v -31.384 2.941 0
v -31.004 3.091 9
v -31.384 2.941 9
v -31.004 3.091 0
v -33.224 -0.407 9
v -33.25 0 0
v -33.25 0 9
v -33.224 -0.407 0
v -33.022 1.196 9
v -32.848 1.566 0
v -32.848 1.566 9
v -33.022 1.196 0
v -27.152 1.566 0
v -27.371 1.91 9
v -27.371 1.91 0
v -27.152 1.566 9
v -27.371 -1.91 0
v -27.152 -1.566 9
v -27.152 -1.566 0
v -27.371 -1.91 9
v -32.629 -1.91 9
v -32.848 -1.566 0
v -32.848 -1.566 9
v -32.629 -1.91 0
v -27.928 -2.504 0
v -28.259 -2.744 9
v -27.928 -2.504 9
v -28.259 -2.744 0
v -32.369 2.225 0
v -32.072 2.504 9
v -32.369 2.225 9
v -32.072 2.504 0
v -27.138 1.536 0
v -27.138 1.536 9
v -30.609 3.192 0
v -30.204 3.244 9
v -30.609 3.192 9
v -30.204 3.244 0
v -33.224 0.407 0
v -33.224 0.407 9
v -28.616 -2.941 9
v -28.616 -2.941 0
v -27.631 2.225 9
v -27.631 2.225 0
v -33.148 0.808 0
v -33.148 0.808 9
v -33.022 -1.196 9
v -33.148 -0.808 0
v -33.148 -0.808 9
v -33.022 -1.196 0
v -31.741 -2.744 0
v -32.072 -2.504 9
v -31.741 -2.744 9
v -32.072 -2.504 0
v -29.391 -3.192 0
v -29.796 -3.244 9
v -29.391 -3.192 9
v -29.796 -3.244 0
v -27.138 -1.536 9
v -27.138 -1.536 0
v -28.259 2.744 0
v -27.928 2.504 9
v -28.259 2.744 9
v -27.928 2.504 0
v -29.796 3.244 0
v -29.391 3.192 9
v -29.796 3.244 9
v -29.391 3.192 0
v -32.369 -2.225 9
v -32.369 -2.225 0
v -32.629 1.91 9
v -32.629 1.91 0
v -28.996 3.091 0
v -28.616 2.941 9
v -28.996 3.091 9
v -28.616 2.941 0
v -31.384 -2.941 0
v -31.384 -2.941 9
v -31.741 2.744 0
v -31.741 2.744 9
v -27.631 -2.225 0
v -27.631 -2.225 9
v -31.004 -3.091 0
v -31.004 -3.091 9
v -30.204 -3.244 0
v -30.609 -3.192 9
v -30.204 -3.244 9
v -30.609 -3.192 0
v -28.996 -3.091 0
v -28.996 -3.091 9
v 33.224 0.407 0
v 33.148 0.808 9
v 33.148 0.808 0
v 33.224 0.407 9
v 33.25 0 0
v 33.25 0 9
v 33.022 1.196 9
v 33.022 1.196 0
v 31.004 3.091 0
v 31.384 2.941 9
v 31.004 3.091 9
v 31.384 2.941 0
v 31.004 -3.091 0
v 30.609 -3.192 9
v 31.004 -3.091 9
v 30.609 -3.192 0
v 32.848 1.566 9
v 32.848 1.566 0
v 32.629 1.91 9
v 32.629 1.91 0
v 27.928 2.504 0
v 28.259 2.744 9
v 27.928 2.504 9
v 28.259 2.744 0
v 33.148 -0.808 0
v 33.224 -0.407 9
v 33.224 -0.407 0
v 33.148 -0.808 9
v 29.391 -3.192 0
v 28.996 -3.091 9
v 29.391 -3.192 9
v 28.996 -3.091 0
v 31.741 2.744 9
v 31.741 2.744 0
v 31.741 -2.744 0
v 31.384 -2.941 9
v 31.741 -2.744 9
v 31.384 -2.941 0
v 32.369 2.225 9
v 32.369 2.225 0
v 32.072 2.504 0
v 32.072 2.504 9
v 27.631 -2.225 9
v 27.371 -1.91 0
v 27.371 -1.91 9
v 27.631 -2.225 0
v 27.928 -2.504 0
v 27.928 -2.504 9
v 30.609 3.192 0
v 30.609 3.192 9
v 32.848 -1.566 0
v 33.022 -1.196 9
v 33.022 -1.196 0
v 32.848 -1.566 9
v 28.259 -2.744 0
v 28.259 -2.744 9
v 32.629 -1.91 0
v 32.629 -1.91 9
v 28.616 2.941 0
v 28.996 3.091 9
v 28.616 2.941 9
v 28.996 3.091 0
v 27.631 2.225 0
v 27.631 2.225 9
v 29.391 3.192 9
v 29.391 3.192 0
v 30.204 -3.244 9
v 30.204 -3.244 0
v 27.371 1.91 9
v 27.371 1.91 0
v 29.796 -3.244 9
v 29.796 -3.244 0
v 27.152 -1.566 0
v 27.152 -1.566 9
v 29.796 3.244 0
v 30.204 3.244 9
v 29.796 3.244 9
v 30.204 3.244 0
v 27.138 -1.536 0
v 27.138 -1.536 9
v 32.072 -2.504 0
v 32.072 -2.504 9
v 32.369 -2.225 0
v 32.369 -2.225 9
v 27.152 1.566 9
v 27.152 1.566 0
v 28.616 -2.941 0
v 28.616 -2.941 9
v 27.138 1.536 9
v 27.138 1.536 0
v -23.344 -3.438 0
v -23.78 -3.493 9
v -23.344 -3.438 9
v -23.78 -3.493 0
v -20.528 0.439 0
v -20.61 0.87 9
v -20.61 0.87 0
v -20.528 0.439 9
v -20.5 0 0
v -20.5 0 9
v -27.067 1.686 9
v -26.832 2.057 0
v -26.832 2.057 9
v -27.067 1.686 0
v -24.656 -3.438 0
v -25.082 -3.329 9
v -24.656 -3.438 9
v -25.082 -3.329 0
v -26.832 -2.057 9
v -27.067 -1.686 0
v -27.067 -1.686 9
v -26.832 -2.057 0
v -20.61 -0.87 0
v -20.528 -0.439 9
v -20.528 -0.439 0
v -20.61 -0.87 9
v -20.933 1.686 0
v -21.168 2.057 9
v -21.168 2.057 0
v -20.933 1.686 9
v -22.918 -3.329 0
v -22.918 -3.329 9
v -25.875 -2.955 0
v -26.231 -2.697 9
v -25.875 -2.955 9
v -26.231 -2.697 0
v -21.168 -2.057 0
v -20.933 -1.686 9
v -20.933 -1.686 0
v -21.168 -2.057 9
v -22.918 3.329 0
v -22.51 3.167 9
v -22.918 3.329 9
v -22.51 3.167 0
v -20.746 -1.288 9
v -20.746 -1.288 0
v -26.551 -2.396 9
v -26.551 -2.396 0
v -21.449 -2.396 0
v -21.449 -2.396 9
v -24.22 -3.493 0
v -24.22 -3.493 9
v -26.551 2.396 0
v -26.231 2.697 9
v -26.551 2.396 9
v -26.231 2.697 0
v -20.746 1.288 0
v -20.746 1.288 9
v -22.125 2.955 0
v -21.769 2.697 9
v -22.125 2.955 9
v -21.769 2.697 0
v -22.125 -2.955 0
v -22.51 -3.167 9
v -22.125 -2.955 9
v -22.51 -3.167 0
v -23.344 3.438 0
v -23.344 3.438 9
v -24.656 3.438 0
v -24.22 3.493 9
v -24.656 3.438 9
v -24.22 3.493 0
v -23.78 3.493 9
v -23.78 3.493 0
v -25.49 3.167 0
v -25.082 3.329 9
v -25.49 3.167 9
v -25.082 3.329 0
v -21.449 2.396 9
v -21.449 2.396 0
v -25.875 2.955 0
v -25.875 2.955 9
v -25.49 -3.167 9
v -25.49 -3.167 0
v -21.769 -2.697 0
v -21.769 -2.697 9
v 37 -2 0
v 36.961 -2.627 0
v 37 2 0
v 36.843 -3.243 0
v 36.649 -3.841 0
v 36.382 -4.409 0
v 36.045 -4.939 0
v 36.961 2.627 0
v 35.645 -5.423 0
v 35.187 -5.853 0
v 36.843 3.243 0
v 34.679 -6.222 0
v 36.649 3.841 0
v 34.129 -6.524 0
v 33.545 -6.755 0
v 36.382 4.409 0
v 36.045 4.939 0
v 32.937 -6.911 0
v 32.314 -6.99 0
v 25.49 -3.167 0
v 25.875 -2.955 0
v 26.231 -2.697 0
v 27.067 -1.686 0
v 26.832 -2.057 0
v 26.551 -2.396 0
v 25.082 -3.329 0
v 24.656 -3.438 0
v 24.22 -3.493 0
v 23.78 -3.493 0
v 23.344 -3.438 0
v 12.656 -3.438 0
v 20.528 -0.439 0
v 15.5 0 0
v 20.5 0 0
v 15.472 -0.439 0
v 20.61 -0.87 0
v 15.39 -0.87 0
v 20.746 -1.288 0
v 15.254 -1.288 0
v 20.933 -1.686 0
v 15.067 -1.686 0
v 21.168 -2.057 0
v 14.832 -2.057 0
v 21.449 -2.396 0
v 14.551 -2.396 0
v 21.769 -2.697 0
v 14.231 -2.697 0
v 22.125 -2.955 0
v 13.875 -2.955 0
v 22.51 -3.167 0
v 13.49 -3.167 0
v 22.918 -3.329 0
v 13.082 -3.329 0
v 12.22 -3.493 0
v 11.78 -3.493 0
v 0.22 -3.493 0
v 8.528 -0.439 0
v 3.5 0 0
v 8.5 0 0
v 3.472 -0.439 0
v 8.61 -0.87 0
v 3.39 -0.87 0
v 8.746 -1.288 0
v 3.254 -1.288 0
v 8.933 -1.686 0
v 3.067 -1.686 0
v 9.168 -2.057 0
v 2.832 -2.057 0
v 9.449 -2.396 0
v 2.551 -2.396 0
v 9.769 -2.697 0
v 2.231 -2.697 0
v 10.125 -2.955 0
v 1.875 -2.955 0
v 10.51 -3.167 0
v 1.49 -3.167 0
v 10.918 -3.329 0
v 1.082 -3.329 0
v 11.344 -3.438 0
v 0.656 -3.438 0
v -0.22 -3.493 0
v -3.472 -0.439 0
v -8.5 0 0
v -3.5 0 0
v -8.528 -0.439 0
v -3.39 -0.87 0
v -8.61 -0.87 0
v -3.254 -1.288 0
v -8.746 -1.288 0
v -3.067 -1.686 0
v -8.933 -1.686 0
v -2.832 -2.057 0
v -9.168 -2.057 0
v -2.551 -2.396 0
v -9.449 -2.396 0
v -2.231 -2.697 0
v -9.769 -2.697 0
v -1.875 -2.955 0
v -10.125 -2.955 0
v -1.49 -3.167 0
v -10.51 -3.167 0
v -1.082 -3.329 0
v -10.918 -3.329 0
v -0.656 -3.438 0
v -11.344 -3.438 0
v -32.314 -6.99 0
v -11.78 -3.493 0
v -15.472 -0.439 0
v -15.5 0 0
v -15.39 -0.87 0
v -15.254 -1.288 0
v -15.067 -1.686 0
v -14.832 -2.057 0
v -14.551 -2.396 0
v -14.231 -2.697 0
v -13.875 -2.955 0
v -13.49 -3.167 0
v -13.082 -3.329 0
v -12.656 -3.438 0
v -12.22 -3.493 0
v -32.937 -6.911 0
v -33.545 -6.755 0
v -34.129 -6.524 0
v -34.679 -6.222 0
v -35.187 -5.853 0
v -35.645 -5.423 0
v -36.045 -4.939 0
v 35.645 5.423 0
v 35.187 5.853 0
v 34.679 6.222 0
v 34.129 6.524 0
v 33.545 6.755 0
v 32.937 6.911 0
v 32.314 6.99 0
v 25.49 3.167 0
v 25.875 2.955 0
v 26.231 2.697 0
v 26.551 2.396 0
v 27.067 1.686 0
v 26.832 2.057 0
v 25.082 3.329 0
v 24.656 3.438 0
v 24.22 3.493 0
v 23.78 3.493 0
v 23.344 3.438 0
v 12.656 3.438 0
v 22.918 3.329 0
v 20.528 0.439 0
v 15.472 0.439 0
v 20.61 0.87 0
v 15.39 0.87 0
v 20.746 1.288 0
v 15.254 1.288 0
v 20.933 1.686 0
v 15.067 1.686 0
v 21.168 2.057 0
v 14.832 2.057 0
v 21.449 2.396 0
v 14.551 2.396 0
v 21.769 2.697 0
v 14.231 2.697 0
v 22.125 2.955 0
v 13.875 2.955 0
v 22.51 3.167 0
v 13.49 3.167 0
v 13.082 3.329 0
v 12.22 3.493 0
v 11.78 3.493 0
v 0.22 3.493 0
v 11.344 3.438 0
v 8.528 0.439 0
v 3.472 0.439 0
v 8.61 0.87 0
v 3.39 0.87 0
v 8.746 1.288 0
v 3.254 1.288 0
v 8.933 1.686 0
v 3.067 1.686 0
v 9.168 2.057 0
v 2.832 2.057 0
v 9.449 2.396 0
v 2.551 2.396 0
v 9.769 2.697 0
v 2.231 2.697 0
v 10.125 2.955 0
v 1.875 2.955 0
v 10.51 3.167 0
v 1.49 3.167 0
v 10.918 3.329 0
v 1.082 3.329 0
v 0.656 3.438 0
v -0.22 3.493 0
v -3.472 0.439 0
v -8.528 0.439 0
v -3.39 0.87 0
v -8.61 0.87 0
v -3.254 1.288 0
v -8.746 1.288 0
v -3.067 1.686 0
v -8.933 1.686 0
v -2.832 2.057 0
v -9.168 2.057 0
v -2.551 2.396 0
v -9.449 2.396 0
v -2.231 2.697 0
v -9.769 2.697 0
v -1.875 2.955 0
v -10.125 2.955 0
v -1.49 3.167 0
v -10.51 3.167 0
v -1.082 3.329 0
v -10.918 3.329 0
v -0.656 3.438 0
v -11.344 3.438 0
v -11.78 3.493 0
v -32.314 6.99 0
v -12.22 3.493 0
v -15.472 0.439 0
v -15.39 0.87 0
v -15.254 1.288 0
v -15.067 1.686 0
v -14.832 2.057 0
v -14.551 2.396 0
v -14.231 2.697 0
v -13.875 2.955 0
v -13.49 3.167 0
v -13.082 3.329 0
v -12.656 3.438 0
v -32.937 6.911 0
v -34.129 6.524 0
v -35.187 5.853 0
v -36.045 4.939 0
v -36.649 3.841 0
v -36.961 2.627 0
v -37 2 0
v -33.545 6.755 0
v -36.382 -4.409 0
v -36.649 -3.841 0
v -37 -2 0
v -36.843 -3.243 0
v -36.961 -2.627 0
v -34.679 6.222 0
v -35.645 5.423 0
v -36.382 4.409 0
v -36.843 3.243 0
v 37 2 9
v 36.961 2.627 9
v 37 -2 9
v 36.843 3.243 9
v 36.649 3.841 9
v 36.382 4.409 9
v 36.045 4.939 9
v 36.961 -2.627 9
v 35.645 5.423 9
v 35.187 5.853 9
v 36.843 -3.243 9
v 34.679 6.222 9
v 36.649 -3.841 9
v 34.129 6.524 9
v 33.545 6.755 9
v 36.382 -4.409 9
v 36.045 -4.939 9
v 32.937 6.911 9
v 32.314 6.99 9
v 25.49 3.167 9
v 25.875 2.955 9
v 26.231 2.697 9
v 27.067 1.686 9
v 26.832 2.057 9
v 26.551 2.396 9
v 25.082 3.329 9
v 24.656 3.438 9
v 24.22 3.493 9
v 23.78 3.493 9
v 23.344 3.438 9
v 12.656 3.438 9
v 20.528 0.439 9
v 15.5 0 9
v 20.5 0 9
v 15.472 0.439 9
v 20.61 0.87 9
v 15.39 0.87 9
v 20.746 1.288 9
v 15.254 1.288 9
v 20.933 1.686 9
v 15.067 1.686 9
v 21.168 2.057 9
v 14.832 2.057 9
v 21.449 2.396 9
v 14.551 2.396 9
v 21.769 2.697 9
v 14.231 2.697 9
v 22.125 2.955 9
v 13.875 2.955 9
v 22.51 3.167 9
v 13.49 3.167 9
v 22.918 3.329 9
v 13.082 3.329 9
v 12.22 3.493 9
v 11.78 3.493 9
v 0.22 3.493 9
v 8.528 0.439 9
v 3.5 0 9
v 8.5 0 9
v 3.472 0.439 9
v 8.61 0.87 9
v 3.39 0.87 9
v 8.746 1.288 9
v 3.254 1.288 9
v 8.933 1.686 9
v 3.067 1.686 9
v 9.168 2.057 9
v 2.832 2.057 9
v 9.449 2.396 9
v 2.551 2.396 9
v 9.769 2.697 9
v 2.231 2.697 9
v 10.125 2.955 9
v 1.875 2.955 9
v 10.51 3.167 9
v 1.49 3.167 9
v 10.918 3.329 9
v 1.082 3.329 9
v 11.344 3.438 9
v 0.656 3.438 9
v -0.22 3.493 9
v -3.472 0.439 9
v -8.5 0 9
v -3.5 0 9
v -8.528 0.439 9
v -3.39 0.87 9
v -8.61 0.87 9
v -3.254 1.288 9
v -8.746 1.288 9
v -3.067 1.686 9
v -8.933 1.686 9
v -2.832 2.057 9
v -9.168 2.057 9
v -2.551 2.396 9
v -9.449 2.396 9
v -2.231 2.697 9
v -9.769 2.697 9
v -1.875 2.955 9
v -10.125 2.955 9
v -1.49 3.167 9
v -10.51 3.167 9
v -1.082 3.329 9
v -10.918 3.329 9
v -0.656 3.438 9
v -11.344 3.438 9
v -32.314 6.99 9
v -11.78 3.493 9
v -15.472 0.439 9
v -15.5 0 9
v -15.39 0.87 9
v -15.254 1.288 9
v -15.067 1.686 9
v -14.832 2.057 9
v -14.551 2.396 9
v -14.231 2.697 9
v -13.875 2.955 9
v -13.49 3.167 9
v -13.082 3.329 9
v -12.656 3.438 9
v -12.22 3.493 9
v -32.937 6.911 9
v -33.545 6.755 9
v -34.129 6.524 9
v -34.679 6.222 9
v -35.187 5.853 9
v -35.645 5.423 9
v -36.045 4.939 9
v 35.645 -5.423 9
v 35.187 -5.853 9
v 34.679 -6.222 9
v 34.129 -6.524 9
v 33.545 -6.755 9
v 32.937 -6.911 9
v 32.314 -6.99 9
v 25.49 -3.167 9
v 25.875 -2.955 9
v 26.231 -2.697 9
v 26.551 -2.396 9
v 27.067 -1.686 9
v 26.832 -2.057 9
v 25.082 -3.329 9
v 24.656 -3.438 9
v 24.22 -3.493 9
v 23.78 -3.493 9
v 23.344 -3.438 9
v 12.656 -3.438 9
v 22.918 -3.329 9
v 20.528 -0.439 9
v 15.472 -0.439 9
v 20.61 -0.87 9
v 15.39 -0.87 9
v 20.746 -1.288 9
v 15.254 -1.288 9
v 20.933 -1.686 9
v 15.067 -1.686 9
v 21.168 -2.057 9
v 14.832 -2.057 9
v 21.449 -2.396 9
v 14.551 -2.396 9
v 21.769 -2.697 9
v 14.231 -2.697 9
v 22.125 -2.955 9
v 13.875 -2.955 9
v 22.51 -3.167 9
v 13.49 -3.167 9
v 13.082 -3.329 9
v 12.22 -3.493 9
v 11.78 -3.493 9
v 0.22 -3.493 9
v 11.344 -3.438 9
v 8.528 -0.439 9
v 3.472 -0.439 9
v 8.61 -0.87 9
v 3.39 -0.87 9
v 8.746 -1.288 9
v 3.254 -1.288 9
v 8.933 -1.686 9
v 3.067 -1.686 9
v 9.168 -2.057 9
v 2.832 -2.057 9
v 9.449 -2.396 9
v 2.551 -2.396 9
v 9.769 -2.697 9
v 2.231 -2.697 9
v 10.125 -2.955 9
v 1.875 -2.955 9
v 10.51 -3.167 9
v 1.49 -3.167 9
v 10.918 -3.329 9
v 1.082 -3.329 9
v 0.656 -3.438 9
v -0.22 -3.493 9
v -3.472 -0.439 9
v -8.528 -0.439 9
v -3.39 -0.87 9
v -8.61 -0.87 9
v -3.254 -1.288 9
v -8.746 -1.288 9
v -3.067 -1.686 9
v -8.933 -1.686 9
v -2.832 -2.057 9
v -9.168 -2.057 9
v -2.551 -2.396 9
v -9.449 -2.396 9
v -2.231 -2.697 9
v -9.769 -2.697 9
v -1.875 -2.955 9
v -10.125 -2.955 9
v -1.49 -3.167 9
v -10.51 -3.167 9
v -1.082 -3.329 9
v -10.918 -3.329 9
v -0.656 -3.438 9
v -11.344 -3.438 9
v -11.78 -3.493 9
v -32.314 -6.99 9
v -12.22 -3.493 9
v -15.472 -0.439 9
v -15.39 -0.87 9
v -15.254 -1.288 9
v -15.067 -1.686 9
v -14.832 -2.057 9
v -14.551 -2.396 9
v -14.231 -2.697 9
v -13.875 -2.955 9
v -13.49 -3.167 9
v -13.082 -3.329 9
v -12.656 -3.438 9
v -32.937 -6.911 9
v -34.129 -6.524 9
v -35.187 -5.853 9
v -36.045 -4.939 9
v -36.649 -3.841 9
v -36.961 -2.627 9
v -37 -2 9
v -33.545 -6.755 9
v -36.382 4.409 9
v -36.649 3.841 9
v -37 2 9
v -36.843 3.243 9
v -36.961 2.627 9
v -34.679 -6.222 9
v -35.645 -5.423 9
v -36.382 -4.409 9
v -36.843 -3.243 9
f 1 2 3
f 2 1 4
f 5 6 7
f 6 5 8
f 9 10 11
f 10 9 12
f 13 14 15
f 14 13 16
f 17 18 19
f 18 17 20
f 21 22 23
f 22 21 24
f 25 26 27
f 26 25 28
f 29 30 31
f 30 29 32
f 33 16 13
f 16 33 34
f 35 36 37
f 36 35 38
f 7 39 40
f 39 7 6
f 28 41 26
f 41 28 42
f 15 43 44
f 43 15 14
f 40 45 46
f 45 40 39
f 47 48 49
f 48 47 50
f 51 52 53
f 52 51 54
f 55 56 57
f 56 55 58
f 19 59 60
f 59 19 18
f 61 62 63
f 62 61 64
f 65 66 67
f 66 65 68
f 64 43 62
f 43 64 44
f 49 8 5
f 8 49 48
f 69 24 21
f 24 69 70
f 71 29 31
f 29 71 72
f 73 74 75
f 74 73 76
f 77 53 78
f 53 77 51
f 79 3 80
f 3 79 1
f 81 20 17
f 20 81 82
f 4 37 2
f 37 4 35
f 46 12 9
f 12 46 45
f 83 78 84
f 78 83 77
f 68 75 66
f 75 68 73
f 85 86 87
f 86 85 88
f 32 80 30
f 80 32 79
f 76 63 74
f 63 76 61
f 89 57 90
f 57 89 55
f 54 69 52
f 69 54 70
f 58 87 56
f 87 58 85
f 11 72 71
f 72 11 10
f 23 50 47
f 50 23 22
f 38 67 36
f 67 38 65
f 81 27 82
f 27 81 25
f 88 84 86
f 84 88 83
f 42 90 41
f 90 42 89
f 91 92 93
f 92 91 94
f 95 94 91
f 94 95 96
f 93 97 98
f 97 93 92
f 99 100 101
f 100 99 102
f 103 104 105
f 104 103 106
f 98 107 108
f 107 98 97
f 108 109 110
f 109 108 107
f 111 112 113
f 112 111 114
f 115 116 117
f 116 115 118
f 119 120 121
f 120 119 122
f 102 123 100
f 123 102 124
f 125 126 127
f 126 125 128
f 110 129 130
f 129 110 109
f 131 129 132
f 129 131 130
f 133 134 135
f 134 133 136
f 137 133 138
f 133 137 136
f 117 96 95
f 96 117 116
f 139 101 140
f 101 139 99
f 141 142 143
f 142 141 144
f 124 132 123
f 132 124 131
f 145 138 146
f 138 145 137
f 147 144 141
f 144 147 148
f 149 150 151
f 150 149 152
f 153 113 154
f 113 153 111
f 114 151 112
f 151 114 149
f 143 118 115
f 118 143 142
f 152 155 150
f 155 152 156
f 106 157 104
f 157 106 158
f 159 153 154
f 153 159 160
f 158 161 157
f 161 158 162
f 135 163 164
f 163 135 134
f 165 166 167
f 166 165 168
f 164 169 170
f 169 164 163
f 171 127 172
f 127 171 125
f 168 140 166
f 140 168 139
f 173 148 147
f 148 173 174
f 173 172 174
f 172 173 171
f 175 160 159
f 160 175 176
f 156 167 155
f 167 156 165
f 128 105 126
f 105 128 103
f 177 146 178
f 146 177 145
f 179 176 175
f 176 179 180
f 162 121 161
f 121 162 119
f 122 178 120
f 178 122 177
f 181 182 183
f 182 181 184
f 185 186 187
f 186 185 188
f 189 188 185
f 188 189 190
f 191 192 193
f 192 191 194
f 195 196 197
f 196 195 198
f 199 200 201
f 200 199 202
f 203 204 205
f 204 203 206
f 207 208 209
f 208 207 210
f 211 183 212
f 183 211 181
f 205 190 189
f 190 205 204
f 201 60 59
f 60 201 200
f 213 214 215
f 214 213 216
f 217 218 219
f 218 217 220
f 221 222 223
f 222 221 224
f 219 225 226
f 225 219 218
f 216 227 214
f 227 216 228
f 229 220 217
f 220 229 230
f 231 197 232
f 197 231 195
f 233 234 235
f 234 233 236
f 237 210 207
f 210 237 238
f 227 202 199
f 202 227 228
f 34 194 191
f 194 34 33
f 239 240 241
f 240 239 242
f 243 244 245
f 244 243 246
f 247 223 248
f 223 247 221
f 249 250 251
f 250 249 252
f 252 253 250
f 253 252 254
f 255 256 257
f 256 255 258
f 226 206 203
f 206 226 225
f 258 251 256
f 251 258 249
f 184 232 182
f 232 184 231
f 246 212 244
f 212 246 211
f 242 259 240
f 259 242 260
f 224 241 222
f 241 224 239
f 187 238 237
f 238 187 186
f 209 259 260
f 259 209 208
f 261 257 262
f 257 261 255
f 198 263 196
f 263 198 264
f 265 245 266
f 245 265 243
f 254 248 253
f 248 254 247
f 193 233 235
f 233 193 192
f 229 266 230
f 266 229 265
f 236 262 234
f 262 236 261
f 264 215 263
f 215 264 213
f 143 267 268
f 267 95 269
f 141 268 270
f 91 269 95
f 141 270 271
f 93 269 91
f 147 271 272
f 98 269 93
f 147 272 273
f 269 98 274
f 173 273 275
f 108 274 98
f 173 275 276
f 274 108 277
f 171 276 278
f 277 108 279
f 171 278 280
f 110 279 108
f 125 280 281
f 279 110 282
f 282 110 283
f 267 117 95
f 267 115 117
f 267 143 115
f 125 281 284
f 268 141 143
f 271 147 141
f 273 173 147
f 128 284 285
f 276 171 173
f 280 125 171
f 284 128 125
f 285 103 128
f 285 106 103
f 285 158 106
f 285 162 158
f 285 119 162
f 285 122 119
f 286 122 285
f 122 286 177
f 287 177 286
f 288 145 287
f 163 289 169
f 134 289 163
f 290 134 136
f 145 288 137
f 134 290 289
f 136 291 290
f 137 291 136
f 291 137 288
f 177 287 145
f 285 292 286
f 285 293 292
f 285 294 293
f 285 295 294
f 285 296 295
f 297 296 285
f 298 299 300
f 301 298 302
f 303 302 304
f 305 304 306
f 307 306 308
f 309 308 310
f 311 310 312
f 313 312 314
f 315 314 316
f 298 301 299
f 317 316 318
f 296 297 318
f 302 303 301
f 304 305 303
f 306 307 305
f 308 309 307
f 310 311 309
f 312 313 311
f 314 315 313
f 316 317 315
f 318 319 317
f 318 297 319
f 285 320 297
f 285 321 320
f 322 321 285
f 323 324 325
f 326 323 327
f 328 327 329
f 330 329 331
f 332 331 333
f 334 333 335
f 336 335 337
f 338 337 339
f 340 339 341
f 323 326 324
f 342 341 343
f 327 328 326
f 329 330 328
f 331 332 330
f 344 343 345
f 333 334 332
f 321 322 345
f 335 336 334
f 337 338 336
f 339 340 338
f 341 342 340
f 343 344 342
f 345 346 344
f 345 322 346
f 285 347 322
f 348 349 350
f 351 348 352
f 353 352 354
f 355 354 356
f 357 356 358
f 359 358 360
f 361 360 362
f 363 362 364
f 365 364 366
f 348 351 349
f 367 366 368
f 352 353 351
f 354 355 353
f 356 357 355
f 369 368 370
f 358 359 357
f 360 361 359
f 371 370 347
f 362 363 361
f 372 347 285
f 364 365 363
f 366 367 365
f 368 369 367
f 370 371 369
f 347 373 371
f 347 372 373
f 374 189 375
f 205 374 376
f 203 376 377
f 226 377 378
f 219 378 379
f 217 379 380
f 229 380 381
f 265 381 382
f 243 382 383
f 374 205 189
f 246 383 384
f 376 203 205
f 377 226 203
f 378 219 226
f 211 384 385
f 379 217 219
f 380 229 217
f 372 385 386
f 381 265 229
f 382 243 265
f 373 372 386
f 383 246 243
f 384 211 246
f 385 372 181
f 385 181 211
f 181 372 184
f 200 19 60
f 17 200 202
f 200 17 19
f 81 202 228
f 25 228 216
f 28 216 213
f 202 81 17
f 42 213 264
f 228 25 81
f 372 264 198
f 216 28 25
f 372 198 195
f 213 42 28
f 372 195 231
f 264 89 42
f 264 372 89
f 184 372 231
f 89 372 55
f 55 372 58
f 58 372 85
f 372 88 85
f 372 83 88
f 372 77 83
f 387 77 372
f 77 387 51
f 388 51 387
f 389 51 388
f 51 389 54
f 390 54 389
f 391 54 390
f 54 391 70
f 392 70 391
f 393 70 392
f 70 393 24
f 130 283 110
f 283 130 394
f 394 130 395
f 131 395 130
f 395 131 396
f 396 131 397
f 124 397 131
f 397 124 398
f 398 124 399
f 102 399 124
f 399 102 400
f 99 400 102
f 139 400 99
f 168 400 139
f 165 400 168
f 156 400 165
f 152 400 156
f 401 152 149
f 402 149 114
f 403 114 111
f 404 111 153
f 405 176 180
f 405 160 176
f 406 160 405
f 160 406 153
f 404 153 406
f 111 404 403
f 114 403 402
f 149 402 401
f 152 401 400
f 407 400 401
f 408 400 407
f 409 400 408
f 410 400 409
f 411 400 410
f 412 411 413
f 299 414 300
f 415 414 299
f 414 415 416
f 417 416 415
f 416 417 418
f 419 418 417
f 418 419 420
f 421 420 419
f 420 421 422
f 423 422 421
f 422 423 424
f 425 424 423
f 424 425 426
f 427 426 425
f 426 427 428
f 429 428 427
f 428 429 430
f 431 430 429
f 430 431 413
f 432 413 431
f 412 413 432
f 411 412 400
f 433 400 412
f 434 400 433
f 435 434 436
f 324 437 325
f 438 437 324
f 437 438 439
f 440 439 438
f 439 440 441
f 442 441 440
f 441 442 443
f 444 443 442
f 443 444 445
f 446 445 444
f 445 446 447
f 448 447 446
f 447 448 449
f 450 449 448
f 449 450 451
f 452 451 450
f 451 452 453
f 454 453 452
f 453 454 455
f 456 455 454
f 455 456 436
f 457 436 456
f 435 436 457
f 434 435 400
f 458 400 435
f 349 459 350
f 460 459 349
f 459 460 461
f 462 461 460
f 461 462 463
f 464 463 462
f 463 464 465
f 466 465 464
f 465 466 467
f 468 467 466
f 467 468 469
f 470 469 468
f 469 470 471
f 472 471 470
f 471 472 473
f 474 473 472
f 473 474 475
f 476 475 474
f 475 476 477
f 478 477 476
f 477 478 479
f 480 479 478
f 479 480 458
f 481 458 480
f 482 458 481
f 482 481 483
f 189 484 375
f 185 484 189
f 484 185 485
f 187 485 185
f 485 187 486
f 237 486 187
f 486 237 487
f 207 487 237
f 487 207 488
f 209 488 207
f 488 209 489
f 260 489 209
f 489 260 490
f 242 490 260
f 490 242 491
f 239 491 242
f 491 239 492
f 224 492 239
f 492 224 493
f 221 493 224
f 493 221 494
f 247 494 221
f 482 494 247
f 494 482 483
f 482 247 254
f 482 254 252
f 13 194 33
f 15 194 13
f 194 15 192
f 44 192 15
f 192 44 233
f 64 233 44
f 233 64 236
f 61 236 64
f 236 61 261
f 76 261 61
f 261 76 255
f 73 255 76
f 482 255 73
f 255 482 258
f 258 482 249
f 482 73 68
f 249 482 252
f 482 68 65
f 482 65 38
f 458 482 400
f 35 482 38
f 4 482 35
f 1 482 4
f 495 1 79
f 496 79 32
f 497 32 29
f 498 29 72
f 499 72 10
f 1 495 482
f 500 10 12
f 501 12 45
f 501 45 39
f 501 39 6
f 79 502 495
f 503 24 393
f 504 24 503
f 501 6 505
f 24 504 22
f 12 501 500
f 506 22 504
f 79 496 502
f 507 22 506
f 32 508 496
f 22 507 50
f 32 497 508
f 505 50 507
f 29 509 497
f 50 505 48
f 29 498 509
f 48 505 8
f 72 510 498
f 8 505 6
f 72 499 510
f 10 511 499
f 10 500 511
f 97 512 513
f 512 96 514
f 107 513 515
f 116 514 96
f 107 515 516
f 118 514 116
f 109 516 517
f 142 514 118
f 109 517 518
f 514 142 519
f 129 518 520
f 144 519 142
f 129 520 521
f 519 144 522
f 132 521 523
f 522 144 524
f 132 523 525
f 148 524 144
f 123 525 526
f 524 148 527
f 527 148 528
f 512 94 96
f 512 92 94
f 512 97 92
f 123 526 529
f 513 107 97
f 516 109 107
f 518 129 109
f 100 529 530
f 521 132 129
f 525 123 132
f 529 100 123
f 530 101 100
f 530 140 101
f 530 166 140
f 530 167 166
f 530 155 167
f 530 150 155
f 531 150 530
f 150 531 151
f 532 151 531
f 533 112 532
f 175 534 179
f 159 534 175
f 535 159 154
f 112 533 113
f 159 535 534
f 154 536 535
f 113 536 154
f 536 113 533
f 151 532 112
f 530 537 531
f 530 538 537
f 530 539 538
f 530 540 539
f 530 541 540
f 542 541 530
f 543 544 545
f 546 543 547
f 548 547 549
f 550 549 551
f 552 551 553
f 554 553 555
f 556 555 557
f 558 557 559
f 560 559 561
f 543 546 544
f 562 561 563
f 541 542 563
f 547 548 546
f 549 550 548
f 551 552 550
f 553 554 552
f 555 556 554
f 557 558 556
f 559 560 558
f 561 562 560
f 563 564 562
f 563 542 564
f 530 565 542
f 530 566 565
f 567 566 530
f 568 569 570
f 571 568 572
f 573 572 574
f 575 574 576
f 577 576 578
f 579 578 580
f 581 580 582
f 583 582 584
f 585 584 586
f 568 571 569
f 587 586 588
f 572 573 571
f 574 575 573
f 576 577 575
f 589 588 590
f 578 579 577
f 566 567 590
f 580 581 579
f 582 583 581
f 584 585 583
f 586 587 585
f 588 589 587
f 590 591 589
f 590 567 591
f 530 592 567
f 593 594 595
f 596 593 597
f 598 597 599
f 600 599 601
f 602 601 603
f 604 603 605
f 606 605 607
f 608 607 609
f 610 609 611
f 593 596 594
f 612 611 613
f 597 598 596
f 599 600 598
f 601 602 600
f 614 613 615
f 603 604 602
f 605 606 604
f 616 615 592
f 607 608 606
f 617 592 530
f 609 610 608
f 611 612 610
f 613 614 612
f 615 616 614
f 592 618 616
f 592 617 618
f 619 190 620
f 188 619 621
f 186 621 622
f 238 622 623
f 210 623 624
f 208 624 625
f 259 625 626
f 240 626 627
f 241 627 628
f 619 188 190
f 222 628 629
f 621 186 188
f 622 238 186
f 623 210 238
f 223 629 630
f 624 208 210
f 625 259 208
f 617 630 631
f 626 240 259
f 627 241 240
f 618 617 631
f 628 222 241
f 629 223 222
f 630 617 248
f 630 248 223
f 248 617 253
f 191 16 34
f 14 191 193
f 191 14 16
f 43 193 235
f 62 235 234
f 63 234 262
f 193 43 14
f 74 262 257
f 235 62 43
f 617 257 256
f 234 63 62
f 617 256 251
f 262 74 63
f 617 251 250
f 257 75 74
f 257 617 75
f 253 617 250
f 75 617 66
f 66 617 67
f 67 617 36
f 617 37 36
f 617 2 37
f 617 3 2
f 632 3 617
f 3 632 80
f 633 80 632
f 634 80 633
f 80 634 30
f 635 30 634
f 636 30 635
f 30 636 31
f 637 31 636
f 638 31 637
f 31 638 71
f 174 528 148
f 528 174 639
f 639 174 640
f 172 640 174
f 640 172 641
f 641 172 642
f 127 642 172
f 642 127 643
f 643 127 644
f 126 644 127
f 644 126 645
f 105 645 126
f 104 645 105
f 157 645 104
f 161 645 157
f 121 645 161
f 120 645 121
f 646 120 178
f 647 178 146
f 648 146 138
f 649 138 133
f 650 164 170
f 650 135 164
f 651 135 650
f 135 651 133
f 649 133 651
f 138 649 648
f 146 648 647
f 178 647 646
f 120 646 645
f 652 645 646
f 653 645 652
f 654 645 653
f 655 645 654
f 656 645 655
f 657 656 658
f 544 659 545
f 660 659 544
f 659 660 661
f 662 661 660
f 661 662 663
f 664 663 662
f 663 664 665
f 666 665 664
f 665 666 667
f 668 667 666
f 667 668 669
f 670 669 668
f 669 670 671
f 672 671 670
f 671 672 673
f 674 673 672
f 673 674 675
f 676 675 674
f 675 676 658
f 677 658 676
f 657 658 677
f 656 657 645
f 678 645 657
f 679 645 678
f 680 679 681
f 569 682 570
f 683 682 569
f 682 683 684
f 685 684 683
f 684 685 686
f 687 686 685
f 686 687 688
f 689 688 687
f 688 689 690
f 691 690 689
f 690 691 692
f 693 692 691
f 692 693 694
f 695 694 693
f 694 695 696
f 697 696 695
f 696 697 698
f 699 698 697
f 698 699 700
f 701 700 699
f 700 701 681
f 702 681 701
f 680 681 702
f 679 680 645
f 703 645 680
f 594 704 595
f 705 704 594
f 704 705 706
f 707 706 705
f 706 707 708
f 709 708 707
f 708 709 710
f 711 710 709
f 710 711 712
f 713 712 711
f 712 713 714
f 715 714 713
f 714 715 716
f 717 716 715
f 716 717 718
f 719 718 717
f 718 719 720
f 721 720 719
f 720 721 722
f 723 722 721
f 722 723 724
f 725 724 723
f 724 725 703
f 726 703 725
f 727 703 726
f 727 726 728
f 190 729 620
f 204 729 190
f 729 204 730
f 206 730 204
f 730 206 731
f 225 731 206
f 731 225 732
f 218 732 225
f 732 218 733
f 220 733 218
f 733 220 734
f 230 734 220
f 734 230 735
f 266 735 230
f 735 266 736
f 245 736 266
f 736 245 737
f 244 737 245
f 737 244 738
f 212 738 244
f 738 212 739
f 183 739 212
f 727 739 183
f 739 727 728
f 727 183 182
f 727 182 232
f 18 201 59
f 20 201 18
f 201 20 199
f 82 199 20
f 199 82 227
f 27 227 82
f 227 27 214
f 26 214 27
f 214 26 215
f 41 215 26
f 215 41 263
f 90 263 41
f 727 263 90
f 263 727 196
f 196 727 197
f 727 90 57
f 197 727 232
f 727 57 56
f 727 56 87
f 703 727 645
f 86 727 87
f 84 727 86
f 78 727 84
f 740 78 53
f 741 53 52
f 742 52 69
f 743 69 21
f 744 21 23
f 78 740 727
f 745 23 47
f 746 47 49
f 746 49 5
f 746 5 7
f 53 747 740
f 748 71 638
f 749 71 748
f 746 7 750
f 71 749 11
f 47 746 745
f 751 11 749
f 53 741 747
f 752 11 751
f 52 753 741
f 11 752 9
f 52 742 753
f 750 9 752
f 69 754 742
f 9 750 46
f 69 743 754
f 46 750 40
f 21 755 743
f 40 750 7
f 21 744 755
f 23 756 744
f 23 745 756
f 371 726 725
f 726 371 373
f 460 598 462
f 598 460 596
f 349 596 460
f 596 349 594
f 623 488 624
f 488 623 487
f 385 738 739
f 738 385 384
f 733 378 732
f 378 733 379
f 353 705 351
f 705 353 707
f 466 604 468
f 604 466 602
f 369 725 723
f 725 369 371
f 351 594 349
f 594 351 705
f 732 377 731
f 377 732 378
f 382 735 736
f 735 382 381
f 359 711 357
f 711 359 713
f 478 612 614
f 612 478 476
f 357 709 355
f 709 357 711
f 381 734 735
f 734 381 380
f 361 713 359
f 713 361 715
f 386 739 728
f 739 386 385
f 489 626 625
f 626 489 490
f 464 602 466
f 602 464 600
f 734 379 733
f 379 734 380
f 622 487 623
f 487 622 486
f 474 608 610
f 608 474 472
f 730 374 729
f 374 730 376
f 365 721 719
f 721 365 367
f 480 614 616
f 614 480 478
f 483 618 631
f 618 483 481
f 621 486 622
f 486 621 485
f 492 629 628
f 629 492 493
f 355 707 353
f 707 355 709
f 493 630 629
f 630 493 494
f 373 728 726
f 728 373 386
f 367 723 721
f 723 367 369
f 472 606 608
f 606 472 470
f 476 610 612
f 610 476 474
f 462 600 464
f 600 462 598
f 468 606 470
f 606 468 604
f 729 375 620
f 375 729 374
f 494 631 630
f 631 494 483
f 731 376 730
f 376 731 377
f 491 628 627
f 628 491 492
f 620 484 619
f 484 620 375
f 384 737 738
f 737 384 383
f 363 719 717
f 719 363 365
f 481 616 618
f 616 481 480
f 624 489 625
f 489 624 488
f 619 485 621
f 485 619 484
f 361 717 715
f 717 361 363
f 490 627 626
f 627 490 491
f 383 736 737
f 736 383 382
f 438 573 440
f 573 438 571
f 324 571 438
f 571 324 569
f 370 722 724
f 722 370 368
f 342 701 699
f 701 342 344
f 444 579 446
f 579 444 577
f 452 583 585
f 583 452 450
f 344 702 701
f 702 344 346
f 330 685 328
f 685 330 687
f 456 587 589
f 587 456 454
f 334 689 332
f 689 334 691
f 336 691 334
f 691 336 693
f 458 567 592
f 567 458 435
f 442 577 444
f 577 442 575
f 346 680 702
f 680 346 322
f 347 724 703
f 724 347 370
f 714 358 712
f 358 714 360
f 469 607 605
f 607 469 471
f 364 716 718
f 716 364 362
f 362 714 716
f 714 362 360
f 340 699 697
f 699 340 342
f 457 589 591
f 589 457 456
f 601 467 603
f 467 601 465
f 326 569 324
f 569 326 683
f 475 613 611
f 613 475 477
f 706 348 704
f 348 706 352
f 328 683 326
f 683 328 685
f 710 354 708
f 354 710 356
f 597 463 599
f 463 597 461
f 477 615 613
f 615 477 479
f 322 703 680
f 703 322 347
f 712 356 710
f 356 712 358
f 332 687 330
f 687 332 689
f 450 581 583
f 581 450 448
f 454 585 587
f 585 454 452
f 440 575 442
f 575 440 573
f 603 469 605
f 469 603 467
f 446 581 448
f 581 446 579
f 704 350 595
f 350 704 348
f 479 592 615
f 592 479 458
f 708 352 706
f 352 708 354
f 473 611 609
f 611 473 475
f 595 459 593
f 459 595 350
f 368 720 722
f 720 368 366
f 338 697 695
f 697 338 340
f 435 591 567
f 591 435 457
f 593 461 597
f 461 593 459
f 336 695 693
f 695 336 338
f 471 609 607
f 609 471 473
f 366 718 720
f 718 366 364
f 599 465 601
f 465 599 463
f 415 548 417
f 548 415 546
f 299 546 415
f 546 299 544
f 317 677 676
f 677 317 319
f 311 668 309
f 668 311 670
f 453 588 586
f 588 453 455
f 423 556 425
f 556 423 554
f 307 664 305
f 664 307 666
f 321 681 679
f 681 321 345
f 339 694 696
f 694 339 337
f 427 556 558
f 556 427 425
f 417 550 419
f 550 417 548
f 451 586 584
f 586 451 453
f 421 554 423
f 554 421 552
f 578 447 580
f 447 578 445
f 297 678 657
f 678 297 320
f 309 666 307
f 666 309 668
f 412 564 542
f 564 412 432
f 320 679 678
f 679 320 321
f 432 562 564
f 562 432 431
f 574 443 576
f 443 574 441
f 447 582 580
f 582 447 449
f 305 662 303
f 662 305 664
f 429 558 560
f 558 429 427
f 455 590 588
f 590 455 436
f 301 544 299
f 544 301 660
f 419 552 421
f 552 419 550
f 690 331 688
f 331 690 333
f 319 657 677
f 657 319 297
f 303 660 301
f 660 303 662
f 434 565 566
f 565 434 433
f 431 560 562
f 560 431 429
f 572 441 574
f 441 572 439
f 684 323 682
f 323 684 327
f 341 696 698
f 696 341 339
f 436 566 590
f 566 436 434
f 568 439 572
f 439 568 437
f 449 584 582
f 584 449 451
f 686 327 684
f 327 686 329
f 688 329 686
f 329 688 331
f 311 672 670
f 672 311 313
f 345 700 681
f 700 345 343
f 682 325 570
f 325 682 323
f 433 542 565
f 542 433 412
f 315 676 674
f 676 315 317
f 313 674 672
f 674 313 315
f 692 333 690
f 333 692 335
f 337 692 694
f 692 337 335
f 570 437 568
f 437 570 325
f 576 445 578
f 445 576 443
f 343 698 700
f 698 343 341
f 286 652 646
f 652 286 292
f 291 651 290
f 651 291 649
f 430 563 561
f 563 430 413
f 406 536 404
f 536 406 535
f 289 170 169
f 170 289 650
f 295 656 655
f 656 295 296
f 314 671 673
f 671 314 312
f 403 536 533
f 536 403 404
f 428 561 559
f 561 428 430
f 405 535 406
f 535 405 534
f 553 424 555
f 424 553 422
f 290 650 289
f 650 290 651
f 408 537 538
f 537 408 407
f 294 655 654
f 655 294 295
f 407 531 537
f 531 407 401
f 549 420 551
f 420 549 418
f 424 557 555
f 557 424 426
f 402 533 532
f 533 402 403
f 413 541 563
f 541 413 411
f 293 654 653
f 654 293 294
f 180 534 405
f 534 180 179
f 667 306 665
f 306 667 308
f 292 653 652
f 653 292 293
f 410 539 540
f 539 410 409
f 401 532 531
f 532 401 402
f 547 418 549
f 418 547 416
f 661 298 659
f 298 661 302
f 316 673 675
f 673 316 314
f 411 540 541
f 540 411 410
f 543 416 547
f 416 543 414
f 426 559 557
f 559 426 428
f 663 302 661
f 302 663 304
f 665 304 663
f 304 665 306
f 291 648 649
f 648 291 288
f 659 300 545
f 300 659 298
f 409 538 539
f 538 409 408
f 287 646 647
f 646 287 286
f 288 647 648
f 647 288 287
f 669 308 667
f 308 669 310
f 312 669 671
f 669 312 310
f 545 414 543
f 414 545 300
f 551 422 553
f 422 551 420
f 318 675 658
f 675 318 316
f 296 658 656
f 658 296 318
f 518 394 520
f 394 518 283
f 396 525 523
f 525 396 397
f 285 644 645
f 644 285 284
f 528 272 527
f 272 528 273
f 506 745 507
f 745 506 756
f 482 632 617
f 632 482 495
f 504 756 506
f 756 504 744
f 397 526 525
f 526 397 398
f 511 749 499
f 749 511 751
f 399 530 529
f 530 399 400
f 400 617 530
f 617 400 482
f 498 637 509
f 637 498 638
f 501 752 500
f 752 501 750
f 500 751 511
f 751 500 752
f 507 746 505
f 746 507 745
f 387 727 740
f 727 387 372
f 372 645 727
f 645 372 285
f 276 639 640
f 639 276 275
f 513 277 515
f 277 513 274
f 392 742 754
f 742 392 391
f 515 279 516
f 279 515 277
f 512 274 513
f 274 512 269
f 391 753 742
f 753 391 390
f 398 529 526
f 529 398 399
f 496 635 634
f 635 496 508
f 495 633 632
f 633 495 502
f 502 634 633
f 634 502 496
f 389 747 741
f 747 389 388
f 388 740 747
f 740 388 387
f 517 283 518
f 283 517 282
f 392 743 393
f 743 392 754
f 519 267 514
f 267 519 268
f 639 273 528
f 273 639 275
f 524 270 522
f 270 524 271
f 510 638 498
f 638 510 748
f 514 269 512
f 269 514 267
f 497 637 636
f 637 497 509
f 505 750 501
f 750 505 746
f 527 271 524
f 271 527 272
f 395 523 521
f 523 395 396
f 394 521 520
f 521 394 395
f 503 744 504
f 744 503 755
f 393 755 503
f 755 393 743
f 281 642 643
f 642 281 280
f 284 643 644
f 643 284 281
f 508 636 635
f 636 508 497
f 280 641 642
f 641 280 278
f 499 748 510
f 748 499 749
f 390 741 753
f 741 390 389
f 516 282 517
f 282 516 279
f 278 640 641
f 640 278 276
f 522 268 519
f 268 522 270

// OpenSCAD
$fn = 50;

difference() {
	union() {
		hull() {
			translate(v = [-32.0, 2.0, 0]) {
				cylinder(h = 9, r = 5);
			}
			translate(v = [32.0, 2.0, 0]) {
				cylinder(h = 9, r = 5);
			}
			translate(v = [-32.0, -2.0, 0]) {
				cylinder(h = 9, r = 5);
			}
			translate(v = [32.0, -2.0, 0]) {
				cylinder(h = 9, r = 5);
			}
		}
	}
	union() {
		translate(v = [-30.0, 0.0, -100.0]) {
			cylinder(h = 200, r = 3.25);
		}
		translate(v = [30.0, 0.0, -100.0]) {
			cylinder(h = 200, r = 3.25);
		}
		translate(v = [-30.0, 0.0, -100.0]) {
			cylinder(h = 200, r = 1.8);
		}
		translate(v = [30.0, 0.0, -100.0]) {
			cylinder(h = 200, r = 1.8);
		}
		translate(v = [-24.0, 0, 0.0]) {
			cylinder(h = 9, r = 3.5);
		}
		translate(v = [-12.0, 0, 0.0]) {
			cylinder(h = 9, r = 3.5);
		}
		cylinder(h = 9, r = 3.5);
		translate(v = [12.0, 0, 0.0]) {
			cylinder(h = 9, r = 3.5);
		}
		translate(v = [24.0, 0, 0.0]) {
			cylinder(h = 9, r = 3.5);
		}
	}
}
